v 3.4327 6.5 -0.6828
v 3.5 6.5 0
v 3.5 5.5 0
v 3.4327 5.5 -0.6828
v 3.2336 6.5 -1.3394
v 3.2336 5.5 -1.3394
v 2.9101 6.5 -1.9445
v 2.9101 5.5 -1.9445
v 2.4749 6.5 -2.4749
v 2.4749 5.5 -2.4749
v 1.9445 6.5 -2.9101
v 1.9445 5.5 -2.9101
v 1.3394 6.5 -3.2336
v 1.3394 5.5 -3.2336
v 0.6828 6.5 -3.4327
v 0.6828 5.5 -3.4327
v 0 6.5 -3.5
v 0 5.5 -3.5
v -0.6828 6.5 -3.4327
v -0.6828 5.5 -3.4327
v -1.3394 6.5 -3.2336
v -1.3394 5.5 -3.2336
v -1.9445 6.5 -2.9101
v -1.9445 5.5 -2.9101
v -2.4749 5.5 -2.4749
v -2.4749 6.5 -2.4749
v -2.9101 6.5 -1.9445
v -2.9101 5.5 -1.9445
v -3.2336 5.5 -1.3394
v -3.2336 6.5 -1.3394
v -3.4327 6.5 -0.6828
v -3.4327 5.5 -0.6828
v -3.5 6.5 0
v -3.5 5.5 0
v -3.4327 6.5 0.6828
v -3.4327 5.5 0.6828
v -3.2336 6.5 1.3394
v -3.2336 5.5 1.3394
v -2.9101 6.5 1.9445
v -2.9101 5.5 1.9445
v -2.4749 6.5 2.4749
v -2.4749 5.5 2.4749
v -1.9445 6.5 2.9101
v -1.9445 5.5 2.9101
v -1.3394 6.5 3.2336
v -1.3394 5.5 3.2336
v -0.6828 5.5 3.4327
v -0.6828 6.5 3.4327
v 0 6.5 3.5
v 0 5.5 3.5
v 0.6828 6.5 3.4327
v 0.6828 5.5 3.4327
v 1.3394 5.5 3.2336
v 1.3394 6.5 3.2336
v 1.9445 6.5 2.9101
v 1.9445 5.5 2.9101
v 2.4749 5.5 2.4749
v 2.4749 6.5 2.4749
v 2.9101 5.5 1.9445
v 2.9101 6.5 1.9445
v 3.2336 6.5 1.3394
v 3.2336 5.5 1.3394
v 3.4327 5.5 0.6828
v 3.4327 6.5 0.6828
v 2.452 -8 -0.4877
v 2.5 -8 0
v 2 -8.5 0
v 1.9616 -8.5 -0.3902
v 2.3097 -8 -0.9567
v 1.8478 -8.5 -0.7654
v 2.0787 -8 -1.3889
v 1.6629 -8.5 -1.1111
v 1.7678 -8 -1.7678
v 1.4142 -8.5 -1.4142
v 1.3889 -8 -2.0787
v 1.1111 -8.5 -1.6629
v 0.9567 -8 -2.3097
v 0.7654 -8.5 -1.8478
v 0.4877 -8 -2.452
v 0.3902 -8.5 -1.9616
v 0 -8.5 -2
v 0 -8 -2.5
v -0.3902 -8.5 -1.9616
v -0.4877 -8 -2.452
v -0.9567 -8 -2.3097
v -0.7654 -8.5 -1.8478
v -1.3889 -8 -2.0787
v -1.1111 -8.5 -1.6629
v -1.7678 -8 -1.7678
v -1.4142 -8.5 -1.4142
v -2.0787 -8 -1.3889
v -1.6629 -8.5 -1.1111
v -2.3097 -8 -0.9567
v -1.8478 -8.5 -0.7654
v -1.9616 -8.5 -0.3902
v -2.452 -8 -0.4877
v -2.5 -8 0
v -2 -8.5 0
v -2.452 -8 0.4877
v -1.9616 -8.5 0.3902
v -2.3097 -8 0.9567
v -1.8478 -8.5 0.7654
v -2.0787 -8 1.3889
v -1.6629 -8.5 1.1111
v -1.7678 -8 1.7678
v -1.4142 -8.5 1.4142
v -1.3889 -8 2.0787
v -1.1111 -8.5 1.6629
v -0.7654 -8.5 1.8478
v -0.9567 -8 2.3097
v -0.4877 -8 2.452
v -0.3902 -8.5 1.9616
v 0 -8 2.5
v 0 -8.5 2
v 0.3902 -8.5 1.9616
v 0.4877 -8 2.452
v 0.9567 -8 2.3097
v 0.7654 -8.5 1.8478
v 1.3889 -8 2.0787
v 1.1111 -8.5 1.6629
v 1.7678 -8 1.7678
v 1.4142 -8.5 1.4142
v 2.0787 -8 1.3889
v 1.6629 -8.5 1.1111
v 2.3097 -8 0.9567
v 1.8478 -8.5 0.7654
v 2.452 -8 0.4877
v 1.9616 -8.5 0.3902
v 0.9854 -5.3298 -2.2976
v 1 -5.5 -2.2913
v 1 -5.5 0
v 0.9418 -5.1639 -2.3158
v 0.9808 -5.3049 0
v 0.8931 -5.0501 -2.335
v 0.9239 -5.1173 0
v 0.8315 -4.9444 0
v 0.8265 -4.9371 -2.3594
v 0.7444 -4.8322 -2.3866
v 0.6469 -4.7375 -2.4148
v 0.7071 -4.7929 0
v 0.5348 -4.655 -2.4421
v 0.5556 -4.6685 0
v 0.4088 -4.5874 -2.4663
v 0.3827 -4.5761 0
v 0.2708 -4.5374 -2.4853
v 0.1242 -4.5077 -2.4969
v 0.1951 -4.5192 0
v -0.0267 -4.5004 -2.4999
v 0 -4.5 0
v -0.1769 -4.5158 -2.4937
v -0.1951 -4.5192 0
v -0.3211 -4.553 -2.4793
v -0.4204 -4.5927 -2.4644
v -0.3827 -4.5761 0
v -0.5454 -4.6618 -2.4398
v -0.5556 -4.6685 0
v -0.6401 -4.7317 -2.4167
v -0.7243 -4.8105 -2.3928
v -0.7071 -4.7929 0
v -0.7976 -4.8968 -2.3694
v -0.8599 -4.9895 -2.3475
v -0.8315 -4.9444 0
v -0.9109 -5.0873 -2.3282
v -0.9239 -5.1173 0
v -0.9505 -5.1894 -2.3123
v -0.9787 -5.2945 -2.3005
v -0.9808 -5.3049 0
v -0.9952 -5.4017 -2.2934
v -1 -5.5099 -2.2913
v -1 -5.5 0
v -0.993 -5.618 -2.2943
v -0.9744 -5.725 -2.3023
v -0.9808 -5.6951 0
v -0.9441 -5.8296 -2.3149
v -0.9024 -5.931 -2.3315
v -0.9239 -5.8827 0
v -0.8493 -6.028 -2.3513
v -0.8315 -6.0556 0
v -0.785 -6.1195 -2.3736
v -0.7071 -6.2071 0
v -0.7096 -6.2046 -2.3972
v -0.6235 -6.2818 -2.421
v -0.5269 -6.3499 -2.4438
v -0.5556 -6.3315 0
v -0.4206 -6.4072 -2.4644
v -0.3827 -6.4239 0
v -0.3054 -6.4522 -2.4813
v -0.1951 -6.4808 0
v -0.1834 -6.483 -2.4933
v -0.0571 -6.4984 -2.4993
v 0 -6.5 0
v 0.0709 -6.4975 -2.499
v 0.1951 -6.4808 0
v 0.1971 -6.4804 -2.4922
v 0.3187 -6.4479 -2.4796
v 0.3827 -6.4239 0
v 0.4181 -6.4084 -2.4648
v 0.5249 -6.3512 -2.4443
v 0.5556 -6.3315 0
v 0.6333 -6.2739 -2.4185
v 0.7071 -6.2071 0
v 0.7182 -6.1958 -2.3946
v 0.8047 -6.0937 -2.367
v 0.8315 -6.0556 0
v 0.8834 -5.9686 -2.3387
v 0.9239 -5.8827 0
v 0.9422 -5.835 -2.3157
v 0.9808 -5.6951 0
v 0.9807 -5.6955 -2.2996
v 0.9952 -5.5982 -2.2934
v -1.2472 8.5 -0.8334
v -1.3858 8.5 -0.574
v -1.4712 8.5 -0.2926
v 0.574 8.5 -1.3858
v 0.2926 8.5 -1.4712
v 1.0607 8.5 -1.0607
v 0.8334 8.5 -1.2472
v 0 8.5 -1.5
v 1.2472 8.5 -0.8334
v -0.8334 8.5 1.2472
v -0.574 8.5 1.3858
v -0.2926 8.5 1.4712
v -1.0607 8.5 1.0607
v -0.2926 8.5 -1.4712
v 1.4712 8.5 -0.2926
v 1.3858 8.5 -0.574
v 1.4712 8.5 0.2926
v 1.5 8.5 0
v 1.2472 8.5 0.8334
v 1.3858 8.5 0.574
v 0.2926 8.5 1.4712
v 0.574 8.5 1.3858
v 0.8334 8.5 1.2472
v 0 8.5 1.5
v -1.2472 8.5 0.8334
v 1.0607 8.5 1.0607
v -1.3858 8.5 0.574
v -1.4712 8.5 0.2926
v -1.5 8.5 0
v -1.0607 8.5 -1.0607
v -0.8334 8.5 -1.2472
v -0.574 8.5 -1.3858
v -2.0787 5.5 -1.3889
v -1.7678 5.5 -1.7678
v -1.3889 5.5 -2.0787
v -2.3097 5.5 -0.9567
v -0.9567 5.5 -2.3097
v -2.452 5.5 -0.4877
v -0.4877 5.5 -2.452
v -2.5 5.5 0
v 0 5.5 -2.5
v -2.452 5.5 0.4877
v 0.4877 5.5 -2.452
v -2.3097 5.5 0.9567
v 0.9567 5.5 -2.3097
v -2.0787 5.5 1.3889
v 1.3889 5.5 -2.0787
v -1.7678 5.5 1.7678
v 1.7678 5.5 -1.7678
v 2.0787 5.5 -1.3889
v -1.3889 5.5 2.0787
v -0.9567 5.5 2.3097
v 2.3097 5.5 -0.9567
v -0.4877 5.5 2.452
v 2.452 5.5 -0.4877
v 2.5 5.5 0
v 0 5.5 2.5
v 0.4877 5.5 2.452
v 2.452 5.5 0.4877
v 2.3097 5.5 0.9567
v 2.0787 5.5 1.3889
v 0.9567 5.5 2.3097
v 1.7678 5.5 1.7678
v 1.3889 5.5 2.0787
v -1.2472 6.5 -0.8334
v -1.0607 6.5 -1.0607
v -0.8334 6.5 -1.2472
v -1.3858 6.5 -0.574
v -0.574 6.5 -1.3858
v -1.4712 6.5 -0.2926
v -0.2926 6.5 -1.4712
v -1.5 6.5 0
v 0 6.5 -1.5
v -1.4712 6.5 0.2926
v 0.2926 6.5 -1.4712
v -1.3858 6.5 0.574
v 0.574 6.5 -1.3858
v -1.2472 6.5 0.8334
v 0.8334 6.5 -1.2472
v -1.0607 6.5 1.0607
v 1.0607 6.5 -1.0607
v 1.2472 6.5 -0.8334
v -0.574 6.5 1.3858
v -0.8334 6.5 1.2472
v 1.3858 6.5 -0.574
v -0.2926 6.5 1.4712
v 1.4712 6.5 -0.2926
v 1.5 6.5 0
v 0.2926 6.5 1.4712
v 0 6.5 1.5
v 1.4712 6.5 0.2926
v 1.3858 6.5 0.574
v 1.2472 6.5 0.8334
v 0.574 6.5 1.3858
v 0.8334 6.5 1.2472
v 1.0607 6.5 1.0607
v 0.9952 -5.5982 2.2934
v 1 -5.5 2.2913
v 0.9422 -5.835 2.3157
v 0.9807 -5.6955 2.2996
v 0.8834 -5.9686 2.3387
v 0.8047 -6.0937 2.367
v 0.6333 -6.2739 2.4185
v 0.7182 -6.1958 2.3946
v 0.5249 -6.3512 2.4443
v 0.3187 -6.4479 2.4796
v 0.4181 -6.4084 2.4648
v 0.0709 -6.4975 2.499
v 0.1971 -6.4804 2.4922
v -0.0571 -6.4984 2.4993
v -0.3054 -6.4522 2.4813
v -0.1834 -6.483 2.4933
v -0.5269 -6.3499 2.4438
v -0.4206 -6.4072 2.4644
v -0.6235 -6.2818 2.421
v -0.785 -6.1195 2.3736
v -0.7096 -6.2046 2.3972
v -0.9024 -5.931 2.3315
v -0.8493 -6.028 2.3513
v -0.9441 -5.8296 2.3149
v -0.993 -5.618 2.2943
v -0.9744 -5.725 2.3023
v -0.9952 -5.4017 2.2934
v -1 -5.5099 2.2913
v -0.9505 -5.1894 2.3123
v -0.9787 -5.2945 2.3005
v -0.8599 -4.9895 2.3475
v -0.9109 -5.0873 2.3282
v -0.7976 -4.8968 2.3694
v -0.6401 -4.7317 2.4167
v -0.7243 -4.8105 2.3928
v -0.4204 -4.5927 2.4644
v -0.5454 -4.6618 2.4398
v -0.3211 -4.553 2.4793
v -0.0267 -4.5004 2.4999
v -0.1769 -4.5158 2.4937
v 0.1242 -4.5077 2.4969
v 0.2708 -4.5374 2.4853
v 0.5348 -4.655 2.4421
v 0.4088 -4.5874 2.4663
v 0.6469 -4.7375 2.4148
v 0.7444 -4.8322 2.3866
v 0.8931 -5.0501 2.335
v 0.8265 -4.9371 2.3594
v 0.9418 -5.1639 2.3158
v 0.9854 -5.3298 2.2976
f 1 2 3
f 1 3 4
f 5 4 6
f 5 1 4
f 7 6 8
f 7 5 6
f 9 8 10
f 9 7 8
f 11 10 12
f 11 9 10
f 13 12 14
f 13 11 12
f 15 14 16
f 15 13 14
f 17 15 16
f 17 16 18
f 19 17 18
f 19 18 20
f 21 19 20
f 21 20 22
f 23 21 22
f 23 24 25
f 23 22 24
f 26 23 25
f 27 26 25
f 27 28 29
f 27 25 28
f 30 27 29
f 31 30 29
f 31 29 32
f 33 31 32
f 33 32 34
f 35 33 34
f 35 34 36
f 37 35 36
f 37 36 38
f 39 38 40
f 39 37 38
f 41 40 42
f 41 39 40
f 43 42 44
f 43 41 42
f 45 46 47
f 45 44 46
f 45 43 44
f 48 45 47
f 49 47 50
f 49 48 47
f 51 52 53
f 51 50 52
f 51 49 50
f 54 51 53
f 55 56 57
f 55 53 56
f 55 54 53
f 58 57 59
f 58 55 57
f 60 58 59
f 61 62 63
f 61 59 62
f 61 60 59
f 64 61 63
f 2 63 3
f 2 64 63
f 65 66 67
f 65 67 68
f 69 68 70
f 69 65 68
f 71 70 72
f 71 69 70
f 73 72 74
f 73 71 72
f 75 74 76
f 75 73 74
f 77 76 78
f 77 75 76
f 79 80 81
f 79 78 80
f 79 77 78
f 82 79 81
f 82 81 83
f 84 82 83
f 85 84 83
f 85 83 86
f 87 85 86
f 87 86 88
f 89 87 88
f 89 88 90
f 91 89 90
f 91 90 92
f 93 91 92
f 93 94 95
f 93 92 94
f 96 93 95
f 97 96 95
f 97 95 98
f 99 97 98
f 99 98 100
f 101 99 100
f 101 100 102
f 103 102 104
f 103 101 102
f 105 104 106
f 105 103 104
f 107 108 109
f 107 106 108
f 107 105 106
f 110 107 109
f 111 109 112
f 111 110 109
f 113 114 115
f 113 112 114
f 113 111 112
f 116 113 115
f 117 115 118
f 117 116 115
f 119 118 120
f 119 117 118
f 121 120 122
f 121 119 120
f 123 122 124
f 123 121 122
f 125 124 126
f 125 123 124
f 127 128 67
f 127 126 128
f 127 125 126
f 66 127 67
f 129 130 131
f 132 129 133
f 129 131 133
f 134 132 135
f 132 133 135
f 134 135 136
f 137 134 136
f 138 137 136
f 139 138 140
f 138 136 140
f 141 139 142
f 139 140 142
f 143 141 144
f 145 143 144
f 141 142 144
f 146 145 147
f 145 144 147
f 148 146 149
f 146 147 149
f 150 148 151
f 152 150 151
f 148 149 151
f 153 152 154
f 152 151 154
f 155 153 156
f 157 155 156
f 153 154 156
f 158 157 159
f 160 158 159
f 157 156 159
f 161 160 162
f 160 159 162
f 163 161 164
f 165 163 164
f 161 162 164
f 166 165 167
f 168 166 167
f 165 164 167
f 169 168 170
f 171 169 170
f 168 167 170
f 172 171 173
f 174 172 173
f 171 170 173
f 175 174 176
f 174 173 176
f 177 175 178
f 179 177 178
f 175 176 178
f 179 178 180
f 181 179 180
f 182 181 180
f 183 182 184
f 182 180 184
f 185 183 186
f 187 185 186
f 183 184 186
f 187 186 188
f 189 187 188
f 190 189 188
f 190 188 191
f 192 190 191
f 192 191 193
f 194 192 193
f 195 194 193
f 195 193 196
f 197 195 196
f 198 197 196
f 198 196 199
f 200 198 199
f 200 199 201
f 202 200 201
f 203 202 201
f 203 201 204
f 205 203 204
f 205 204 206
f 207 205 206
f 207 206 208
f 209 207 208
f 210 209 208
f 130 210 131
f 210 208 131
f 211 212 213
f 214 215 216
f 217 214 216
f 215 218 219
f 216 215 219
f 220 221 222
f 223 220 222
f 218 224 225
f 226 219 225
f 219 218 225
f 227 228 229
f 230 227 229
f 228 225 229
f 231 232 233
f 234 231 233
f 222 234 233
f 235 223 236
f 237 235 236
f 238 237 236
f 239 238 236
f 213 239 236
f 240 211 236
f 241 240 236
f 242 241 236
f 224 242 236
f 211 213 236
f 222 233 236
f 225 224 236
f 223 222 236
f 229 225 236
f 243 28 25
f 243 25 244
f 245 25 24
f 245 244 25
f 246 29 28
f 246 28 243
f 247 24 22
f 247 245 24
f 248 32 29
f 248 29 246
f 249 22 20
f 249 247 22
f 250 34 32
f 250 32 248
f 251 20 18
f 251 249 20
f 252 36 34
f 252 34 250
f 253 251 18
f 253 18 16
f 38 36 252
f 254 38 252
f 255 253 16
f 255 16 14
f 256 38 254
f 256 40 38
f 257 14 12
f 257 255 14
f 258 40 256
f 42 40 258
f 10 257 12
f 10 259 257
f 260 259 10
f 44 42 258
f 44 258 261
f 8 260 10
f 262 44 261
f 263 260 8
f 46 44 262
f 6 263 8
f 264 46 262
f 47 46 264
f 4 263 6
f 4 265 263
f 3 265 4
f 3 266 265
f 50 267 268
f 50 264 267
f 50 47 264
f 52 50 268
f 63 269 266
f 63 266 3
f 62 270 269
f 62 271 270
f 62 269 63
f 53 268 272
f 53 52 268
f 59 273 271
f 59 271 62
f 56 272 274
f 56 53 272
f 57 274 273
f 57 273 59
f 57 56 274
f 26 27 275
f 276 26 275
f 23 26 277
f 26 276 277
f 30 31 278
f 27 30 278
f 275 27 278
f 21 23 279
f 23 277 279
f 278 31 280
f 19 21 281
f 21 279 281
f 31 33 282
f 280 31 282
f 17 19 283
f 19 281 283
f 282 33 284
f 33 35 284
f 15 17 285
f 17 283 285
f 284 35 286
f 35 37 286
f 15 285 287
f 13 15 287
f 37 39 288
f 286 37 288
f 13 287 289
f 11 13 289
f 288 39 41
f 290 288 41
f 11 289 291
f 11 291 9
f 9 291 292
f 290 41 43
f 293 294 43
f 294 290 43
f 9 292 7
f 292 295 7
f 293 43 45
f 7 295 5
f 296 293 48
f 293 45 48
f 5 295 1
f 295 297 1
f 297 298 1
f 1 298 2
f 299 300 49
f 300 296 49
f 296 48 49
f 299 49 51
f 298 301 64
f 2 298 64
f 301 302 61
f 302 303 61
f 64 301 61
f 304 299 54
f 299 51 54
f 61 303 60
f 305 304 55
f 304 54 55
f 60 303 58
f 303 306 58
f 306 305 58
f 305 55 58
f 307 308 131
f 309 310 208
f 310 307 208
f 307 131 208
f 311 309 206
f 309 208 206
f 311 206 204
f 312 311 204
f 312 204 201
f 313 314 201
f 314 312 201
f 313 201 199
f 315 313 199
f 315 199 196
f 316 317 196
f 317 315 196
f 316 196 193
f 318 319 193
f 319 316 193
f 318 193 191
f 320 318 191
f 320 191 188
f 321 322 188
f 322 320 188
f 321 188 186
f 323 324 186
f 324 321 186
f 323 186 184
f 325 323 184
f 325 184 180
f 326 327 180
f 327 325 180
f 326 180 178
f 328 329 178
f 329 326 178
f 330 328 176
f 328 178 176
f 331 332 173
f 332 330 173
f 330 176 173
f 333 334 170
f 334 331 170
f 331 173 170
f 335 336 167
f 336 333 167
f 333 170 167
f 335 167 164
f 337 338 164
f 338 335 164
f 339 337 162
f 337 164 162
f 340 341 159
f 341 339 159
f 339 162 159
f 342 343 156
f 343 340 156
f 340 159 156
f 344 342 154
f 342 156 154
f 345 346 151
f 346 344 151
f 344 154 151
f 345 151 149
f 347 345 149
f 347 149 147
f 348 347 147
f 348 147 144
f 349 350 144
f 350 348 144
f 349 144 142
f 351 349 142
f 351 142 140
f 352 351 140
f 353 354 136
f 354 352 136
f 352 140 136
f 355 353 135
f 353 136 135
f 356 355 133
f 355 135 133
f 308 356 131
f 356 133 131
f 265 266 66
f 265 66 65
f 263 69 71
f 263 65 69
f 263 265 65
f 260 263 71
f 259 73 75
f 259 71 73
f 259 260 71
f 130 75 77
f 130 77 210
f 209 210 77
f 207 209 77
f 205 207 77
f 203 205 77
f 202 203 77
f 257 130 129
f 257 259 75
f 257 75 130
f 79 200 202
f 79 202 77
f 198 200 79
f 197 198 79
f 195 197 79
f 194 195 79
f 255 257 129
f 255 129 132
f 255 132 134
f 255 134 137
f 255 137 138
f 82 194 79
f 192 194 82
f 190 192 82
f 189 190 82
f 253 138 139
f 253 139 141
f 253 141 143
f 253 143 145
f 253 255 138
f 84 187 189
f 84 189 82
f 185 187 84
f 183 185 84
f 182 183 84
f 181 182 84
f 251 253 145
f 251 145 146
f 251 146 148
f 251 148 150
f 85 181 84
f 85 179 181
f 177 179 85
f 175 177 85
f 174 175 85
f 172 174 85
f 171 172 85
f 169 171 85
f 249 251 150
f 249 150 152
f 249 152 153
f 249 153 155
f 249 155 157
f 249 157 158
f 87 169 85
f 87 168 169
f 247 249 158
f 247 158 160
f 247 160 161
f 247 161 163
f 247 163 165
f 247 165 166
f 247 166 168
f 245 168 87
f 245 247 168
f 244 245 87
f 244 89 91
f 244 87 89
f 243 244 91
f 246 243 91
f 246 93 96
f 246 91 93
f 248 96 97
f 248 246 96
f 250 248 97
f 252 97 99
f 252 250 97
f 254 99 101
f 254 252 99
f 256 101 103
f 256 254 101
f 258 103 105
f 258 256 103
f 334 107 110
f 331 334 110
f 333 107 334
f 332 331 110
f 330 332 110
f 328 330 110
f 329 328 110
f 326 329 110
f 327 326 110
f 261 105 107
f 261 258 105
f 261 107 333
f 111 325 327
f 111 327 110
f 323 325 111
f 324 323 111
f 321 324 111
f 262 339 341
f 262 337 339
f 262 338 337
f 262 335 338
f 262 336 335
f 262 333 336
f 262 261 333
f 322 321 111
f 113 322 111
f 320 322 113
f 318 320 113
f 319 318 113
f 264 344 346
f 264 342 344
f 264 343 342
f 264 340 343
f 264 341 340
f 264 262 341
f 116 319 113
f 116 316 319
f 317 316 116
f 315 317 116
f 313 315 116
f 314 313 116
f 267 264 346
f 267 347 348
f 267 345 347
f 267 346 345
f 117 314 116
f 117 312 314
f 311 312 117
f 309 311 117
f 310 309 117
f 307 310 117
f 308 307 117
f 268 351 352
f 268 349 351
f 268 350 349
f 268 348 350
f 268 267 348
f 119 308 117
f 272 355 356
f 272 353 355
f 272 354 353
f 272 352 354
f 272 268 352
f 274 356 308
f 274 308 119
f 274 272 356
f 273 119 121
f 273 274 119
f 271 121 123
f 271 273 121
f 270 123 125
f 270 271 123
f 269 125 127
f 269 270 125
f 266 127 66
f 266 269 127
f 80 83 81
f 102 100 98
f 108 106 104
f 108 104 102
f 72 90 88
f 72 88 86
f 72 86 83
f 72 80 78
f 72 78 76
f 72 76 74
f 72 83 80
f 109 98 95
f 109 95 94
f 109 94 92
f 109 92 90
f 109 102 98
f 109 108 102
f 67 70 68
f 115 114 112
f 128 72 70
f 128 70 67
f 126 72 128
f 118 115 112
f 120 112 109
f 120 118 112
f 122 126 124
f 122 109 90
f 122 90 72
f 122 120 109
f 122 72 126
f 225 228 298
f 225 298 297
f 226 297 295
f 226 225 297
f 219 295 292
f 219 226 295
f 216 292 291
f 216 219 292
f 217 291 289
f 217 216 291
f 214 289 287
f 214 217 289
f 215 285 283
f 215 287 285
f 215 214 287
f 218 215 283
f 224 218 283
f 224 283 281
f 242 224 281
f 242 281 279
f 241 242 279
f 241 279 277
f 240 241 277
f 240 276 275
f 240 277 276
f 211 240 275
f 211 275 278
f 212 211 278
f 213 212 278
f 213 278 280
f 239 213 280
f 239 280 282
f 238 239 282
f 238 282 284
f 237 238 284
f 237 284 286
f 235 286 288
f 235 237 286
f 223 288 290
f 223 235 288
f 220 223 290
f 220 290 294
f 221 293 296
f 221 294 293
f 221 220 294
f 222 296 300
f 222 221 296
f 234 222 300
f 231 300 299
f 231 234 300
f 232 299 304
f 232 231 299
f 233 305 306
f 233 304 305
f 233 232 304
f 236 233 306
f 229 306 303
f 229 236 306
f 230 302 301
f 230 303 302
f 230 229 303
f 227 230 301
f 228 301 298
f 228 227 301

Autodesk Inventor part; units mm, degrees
ref_plane "YZ Plane" through (0, 0, 0) normal (1, 0, 0) x (0, 1, 0)
ref_plane "XZ Plane" through (0, 0, 0) normal (0, 1, 0) x (-1, 0, 0)
ref_plane "XY Plane" through (0, 0, 0) normal (0, 0, 1) x (1, 0, 0)
sketch "Sketch1" plane through (0, 0, 0) normal (0, 0, 1) x (1, 0, 0)
  line L0 (0, 8.5) -> (0, -8.5)
  line L1 (0, -8.5) -> (2.5, -8.5)
  line L2 (2.5, -8.5) -> (2.5, 5.5)
  line L3 (2.5, 5.5) -> (3.5, 5.5)
  line L4 (3.5, 5.5) -> (3.5, 6.5)
  line L5 (3.5, 6.5) -> (1.5, 6.5)
  line L6 (1.5, 6.5) -> (1.5, 8.5)
  line L7 (1.5, 8.5) -> (0, 8.5)
  point P0 (0, 0)
  point P1 (0, 0)
  dimension "d0" = 3
  dimension "d1" = 5
  dimension "d2" = 7
  dimension "d3" = 2
  dimension "d4" = 1
  dimension "d5" = 17
revolve "Revolution1" add sketch "Sketch1" angle 360 about axis through (0, 8.5, 0) along (0, -1, 0)
sketch "Sketch2" plane through (0, 0, 0) normal (0, 0, 1) x (1, 0, 0)
  circle A0 centre (0, -5.5) radius 1
  line L0 (-2.5, -8.5) -> (2.5, -8.5) projected
  point P0 (0, 0)
  point P1 (0, -8.5)
  dimension "d7" = 2
  dimension "d8" = 4
extrude "Extrusion1" cut sketch "Sketch2" along normal through all both and the other way through all
chamfer "Chamfer1" distance 0.5 angle 45 1 edges at (-2.5, -8.5, 0)
properties part number "Locking Pin"
